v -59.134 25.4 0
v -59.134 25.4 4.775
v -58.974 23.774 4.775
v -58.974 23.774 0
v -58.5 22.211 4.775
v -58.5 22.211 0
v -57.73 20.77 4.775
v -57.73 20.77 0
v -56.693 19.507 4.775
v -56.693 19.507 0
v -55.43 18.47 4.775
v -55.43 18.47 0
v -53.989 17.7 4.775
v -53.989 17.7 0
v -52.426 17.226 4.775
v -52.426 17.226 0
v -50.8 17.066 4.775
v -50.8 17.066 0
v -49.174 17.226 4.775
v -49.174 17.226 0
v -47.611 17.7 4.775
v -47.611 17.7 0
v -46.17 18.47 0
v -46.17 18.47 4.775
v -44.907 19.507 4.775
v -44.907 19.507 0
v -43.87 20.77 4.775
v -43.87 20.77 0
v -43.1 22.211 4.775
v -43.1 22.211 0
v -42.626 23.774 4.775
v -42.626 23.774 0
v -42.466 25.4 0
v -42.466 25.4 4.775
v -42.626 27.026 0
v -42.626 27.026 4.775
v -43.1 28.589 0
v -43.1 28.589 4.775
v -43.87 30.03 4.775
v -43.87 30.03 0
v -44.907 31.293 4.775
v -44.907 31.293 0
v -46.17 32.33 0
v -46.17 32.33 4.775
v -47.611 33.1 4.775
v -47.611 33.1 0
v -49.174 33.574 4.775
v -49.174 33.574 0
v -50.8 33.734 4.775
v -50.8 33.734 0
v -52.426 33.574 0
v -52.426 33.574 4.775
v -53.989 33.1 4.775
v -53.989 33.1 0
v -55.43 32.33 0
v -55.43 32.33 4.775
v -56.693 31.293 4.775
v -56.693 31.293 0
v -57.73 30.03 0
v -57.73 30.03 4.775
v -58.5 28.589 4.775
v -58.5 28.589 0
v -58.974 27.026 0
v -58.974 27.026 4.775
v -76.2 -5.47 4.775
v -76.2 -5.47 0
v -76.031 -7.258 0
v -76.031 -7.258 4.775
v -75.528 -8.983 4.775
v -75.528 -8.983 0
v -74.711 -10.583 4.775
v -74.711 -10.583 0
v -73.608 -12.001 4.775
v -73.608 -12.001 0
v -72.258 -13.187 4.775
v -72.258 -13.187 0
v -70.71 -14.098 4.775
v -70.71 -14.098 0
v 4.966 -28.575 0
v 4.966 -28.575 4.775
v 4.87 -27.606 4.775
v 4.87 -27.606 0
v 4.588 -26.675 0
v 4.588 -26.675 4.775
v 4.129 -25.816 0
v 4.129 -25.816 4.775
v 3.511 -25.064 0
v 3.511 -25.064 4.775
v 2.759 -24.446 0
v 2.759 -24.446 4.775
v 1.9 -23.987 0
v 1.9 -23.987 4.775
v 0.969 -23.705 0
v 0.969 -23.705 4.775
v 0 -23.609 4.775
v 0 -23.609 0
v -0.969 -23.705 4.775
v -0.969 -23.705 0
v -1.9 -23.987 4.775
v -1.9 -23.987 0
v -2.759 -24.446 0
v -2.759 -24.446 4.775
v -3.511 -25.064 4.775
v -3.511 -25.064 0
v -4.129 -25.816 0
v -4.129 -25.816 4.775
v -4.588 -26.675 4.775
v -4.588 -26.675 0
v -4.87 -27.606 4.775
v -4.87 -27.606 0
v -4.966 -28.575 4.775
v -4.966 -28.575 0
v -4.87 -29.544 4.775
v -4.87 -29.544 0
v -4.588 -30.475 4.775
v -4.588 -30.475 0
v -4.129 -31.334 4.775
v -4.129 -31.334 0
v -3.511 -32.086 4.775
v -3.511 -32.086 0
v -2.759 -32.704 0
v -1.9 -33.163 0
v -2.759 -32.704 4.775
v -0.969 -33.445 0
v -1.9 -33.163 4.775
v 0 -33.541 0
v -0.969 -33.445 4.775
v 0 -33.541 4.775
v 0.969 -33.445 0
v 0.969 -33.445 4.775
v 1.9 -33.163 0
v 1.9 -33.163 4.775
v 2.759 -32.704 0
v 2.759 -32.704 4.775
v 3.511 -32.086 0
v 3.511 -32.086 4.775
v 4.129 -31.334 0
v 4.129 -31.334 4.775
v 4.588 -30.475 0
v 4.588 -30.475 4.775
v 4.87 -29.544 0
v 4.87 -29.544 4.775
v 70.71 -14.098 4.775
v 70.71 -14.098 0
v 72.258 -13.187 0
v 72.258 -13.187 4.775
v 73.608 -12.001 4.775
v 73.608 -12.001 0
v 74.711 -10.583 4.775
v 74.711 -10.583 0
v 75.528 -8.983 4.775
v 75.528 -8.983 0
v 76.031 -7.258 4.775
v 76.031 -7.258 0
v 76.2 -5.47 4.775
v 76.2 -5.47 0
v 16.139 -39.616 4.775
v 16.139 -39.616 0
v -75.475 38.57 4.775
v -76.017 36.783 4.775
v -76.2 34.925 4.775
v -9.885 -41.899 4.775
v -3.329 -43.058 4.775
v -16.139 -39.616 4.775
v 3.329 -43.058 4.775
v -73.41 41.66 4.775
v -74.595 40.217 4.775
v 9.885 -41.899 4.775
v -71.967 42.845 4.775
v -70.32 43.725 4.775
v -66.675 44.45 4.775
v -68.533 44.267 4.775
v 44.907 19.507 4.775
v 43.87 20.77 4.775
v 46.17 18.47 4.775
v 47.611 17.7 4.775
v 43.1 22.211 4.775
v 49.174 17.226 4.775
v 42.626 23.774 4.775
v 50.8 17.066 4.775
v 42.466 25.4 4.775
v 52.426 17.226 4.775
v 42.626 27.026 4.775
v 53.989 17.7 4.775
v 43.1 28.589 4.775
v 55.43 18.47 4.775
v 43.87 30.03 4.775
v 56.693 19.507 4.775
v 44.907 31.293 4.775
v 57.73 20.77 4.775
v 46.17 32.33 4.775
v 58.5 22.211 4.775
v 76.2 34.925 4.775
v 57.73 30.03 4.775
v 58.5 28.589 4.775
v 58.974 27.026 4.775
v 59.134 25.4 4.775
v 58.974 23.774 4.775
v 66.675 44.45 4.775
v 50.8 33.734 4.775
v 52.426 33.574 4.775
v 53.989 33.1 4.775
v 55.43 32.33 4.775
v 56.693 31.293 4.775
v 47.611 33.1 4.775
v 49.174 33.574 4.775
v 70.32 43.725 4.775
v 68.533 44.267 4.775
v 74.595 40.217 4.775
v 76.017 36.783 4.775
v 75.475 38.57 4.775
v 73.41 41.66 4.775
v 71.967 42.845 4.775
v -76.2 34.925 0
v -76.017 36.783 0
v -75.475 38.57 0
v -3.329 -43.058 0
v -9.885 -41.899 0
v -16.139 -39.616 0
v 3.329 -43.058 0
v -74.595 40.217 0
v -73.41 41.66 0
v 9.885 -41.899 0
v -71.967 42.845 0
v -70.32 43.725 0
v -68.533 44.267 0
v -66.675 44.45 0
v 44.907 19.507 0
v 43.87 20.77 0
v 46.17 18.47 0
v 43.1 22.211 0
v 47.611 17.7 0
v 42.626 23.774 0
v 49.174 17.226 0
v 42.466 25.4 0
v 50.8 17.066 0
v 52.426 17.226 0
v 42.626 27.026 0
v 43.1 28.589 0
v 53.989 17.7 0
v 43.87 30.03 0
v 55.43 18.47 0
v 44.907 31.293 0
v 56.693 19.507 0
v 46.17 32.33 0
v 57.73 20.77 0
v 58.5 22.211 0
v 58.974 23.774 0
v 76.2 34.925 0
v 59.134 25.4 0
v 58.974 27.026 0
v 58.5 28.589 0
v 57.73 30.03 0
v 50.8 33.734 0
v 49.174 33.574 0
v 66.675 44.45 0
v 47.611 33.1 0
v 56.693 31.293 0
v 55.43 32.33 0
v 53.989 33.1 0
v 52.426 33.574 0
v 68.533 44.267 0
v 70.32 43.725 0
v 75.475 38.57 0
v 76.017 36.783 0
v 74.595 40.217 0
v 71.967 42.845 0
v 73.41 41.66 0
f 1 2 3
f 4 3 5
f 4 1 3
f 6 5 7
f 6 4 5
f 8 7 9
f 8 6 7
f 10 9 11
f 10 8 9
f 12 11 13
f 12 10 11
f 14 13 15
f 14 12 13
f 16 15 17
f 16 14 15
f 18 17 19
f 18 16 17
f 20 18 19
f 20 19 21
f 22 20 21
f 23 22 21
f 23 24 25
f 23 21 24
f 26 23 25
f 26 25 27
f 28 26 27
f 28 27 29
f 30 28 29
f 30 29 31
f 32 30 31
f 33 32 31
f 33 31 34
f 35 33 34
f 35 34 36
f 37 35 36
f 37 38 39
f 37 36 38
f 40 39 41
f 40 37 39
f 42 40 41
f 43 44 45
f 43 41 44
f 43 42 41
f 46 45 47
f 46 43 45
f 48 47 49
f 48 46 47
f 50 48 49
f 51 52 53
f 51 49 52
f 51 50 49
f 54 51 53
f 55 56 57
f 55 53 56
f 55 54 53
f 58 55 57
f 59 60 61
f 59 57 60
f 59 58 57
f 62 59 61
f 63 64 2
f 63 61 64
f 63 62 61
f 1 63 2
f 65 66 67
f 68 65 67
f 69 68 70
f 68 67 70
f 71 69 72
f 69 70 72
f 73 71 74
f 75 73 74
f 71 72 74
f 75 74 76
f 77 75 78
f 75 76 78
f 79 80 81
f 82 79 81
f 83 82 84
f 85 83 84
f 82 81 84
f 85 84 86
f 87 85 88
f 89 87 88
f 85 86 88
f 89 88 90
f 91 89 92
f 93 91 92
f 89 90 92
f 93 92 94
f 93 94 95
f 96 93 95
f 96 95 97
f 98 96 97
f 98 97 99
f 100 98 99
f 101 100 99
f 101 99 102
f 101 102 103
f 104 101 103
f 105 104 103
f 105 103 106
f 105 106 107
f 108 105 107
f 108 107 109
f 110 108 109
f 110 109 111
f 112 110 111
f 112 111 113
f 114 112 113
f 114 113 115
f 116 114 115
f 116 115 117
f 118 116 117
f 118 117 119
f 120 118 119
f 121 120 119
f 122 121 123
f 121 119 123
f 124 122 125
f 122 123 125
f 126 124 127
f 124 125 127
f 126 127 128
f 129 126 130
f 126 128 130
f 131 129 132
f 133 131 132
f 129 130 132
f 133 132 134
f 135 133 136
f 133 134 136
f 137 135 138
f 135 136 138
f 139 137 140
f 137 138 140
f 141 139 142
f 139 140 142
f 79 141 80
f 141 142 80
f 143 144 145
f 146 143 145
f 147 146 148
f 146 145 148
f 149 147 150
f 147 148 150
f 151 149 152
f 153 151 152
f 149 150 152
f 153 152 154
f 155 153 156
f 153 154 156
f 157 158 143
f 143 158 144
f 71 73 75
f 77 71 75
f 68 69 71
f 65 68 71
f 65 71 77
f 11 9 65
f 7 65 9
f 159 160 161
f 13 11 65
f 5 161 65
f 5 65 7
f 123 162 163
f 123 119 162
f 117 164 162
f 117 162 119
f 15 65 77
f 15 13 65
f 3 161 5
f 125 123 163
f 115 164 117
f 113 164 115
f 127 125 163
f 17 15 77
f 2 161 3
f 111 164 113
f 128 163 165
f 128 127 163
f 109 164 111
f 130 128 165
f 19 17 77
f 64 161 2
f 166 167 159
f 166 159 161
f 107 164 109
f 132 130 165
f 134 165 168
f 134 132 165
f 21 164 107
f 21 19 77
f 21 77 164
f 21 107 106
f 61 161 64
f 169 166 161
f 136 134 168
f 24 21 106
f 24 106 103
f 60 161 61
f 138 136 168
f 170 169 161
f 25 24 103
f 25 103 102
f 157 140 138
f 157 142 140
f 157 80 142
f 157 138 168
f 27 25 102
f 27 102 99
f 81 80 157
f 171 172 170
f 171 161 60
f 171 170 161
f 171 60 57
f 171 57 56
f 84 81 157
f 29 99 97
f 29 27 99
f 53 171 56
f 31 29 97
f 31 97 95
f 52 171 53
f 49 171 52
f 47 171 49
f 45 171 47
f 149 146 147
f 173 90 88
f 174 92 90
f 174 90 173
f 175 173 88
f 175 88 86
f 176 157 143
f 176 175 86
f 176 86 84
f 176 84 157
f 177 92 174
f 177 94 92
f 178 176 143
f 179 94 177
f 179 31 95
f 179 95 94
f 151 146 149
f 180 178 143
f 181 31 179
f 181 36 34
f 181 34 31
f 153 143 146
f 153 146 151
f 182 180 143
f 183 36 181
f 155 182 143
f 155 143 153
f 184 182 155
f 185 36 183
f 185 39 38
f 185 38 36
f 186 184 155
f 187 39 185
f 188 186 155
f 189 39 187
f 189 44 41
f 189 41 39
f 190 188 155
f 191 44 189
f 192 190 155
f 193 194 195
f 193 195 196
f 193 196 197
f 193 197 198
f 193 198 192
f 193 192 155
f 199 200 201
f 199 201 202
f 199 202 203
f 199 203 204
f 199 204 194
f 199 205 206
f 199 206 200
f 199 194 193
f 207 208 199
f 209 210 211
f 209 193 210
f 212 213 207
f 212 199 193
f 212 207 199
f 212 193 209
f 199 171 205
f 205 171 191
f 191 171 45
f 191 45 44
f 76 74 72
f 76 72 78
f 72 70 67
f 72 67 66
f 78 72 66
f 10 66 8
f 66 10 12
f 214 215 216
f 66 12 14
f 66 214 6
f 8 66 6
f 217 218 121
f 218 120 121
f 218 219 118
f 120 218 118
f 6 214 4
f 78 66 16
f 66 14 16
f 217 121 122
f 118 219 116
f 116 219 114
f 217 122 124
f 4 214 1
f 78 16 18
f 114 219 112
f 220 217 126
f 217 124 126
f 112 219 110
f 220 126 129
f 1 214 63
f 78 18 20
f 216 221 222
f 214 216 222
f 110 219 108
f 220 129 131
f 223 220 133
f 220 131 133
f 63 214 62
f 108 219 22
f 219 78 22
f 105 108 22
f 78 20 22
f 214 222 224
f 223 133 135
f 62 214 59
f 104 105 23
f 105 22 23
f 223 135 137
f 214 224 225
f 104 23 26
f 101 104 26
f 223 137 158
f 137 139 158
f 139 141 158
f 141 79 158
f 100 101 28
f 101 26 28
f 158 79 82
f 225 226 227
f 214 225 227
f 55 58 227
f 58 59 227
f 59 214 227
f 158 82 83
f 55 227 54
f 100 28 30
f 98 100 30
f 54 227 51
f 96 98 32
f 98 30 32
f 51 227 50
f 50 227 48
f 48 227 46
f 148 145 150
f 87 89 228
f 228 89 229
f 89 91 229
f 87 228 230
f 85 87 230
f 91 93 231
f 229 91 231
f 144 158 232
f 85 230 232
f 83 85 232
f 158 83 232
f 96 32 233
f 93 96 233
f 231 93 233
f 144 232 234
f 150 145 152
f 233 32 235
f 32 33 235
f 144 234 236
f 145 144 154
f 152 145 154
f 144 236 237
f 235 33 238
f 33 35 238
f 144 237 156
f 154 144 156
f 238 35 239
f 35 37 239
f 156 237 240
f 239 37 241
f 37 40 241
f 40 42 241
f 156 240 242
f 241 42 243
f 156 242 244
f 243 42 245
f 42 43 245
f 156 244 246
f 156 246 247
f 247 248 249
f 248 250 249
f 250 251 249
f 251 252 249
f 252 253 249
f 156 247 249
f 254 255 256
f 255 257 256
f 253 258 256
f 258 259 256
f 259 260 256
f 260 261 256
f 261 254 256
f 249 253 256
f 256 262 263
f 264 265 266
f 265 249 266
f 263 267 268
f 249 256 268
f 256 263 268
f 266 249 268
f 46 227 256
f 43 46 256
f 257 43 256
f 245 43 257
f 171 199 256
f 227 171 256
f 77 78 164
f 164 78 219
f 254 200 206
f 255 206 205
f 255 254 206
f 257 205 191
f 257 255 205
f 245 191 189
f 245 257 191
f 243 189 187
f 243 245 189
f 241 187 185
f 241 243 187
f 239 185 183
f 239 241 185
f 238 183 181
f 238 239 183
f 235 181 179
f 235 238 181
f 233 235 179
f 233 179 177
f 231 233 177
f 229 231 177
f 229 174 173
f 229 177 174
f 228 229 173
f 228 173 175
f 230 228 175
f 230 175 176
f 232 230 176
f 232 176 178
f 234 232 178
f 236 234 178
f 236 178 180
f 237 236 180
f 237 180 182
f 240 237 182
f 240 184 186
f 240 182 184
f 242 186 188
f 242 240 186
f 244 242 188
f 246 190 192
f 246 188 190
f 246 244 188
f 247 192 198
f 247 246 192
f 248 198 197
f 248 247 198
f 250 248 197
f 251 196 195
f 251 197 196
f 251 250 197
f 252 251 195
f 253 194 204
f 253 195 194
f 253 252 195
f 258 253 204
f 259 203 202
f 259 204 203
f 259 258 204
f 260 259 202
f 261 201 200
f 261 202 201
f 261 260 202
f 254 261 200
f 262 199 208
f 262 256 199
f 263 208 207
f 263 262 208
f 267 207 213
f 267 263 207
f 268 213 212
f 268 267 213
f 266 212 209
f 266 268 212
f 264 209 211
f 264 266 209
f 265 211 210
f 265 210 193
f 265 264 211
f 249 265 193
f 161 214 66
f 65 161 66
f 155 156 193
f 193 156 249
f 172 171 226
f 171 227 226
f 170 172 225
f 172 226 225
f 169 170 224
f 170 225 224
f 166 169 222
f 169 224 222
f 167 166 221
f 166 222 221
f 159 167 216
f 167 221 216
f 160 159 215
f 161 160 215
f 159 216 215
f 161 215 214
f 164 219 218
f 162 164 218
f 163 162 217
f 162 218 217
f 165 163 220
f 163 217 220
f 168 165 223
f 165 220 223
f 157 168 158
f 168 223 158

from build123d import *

# Parameters (mm, degrees)
BASE_FLANGE1_DEPTH    = 76.2
CUT_EXTRUDE1_DEPTH    = 100.11903454
SKETCH4_R             = 8.334375
CUT_EXTRUDE2_DEPTH    = 100.669004783
FILLET1_R             = 9.525
FLAT_PATTERN1_START   = 4.7752
FLAT_PATTERN1_DEPTH   = 41.610875653
FLAT_PATTERN1_2_DEPTH = 4.7752
SKETCH6_R             = 4.9657
CUT_EXTRUDE4_DEPTH    = 89.346165933


# Read off the part's stored shape, not the designer's step: Flat-Pattern1
# Sheet-metal steps are written as plain solids
with BuildPart() as part:
    # Sketch1 → Base-Flange1 (new, symmetric)
    with BuildSketch(Plane(origin=(0, 0, 0), x_dir=(0, 0, -1), z_dir=(1, 0, 0))):
        with BuildLine():
            Line((0, 44.45), (0, 3.610410109))
            ThreePointArc((0, 3.610410109), (-0.932488229, 0.652935287), (-3.392675737, -1.234832983))
            Line((-3.392675737, -1.234832983), (-44.752861065, -16.288709326))
            Line((-44.752861065, -16.288709326), (-46.386075653, -11.801489123))
            Line((-46.386075653, -11.801489123), (-5.025890325, 3.25238722))
            ThreePointArc((-5.025890325, 3.25238722), (-4.844103071, 3.391877486), (-4.7752, 3.610410109))
            Line((-4.7752, 3.610410109), (-4.7752, 44.45))
            Line((-4.7752, 44.45), (0, 44.45))
        make_face()
    extrude(amount=BASE_FLANGE1_DEPTH, both=True)

    # Sketch3 → Cut-Extrude1 (cut, through all)
    with BuildSketch(Plane(origin=(0, -7.918276224, 35.717035898), x_dir=(1, 0, 0), z_dir=(0, -0.9396926207859093, -0.3420201433256664))):
        with BuildLine():
            Line((-76.2, -20.318857819), (-16.138866151, 7.766752504))
            ThreePointArc((-16.138866151, 7.766752504), (0, 11.353754961), (16.138866151, 7.766752504))
            Line((16.138866151, 7.766752504), (76.2, -20.318857819))
            Line((76.2, -20.318857819), (88.840930233, -20.318857819))
            Line((88.840930233, -20.318857819), (88.840930233, 63.227466393))
            Line((88.840930233, 63.227466393), (-88.840930233, 63.227466393))
            Line((-88.840930233, 63.227466393), (-88.840930233, -20.318857819))
            Line((-88.840930233, -20.318857819), (-76.2, -20.318857819))
        make_face()
    extrude(amount=CUT_EXTRUDE1_DEPTH, mode=Mode.SUBTRACT)

    # Sketch4 → Cut-Extrude2 (cut, through all)
    with BuildSketch(Plane.XY):
        with Locations(Location((50.8, 25.4, 0), (0, 0, 90))):
            Circle(SKETCH4_R)
        with Locations(Location((-50.8, 25.4, 0), (0, 0, 180))):
            Circle(SKETCH4_R)
    extrude(amount=CUT_EXTRUDE2_DEPTH, mode=Mode.SUBTRACT)

    # Fillet1
    fillet1_edges = [part.edges().sort_by_distance(p)[0] for p in [
        (76.2, 44.45, 2.3876),
        (-76.2, -3.212427662, 15.806947849),
        (76.2, -3.212427662, 15.806947849),
        (-76.2, 44.45, 2.3876),
    ]]
    fillet(fillet1_edges, radius=FILLET1_R)

    # Flat-Pattern1 outline → Flat-Pattern1 (cut)
    with BuildSketch(Plane.XY.offset(FLAT_PATTERN1_START)):
        with BuildLine():
            ThreePointArc((70.709716538, -14.097999428), (74.711053136, -10.58321022), (76.2, -5.469750042))
            Line((76.2, -5.469750042), (76.2, 5))
            Line((76.2, 5), (-76.2, 5))
            Line((-76.2, 5), (-76.2, -5.469750042))
            ThreePointArc((-76.2, -5.469750042), (-74.711053136, -10.58321022), (-70.709716538, -14.097999428))
            Line((-70.709716538, -14.097999428), (-16.138866151, -39.616259585))
            ThreePointArc((-16.138866151, -39.616259585), (0, -43.203262043), (16.138866151, -39.616259585))
            Line((16.138866151, -39.616259585), (70.709716538, -14.097999428))
        make_face()
    extrude(amount=FLAT_PATTERN1_DEPTH, mode=Mode.SUBTRACT)

    # Flat-Pattern1 2 outline → Flat-Pattern1 2 (add)
    with BuildSketch(Plane.XY):
        with BuildLine():
            ThreePointArc((70.709716538, -14.097999428), (74.711053136, -10.58321022), (76.2, -5.469750042))
            Line((76.2, -5.469750042), (76.2, 5))
            Line((76.2, 5), (-76.2, 5))
            Line((-76.2, 5), (-76.2, -5.469750042))
            ThreePointArc((-76.2, -5.469750042), (-74.711053136, -10.58321022), (-70.709716538, -14.097999428))
            Line((-70.709716538, -14.097999428), (-16.138866151, -39.616259585))
            ThreePointArc((-16.138866151, -39.616259585), (0, -43.203262043), (16.138866151, -39.616259585))
            Line((16.138866151, -39.616259585), (70.709716538, -14.097999428))
        make_face()
    extrude(amount=FLAT_PATTERN1_2_DEPTH)

    # Sketch6 → Cut-Extrude4 (cut, through all)
    with BuildSketch(Plane.XY.offset(4.7752)):
        with Locations((0, -28.575)):
            Circle(SKETCH6_R)
    extrude(amount=-CUT_EXTRUDE4_DEPTH, mode=Mode.SUBTRACT)


solid = part.part
